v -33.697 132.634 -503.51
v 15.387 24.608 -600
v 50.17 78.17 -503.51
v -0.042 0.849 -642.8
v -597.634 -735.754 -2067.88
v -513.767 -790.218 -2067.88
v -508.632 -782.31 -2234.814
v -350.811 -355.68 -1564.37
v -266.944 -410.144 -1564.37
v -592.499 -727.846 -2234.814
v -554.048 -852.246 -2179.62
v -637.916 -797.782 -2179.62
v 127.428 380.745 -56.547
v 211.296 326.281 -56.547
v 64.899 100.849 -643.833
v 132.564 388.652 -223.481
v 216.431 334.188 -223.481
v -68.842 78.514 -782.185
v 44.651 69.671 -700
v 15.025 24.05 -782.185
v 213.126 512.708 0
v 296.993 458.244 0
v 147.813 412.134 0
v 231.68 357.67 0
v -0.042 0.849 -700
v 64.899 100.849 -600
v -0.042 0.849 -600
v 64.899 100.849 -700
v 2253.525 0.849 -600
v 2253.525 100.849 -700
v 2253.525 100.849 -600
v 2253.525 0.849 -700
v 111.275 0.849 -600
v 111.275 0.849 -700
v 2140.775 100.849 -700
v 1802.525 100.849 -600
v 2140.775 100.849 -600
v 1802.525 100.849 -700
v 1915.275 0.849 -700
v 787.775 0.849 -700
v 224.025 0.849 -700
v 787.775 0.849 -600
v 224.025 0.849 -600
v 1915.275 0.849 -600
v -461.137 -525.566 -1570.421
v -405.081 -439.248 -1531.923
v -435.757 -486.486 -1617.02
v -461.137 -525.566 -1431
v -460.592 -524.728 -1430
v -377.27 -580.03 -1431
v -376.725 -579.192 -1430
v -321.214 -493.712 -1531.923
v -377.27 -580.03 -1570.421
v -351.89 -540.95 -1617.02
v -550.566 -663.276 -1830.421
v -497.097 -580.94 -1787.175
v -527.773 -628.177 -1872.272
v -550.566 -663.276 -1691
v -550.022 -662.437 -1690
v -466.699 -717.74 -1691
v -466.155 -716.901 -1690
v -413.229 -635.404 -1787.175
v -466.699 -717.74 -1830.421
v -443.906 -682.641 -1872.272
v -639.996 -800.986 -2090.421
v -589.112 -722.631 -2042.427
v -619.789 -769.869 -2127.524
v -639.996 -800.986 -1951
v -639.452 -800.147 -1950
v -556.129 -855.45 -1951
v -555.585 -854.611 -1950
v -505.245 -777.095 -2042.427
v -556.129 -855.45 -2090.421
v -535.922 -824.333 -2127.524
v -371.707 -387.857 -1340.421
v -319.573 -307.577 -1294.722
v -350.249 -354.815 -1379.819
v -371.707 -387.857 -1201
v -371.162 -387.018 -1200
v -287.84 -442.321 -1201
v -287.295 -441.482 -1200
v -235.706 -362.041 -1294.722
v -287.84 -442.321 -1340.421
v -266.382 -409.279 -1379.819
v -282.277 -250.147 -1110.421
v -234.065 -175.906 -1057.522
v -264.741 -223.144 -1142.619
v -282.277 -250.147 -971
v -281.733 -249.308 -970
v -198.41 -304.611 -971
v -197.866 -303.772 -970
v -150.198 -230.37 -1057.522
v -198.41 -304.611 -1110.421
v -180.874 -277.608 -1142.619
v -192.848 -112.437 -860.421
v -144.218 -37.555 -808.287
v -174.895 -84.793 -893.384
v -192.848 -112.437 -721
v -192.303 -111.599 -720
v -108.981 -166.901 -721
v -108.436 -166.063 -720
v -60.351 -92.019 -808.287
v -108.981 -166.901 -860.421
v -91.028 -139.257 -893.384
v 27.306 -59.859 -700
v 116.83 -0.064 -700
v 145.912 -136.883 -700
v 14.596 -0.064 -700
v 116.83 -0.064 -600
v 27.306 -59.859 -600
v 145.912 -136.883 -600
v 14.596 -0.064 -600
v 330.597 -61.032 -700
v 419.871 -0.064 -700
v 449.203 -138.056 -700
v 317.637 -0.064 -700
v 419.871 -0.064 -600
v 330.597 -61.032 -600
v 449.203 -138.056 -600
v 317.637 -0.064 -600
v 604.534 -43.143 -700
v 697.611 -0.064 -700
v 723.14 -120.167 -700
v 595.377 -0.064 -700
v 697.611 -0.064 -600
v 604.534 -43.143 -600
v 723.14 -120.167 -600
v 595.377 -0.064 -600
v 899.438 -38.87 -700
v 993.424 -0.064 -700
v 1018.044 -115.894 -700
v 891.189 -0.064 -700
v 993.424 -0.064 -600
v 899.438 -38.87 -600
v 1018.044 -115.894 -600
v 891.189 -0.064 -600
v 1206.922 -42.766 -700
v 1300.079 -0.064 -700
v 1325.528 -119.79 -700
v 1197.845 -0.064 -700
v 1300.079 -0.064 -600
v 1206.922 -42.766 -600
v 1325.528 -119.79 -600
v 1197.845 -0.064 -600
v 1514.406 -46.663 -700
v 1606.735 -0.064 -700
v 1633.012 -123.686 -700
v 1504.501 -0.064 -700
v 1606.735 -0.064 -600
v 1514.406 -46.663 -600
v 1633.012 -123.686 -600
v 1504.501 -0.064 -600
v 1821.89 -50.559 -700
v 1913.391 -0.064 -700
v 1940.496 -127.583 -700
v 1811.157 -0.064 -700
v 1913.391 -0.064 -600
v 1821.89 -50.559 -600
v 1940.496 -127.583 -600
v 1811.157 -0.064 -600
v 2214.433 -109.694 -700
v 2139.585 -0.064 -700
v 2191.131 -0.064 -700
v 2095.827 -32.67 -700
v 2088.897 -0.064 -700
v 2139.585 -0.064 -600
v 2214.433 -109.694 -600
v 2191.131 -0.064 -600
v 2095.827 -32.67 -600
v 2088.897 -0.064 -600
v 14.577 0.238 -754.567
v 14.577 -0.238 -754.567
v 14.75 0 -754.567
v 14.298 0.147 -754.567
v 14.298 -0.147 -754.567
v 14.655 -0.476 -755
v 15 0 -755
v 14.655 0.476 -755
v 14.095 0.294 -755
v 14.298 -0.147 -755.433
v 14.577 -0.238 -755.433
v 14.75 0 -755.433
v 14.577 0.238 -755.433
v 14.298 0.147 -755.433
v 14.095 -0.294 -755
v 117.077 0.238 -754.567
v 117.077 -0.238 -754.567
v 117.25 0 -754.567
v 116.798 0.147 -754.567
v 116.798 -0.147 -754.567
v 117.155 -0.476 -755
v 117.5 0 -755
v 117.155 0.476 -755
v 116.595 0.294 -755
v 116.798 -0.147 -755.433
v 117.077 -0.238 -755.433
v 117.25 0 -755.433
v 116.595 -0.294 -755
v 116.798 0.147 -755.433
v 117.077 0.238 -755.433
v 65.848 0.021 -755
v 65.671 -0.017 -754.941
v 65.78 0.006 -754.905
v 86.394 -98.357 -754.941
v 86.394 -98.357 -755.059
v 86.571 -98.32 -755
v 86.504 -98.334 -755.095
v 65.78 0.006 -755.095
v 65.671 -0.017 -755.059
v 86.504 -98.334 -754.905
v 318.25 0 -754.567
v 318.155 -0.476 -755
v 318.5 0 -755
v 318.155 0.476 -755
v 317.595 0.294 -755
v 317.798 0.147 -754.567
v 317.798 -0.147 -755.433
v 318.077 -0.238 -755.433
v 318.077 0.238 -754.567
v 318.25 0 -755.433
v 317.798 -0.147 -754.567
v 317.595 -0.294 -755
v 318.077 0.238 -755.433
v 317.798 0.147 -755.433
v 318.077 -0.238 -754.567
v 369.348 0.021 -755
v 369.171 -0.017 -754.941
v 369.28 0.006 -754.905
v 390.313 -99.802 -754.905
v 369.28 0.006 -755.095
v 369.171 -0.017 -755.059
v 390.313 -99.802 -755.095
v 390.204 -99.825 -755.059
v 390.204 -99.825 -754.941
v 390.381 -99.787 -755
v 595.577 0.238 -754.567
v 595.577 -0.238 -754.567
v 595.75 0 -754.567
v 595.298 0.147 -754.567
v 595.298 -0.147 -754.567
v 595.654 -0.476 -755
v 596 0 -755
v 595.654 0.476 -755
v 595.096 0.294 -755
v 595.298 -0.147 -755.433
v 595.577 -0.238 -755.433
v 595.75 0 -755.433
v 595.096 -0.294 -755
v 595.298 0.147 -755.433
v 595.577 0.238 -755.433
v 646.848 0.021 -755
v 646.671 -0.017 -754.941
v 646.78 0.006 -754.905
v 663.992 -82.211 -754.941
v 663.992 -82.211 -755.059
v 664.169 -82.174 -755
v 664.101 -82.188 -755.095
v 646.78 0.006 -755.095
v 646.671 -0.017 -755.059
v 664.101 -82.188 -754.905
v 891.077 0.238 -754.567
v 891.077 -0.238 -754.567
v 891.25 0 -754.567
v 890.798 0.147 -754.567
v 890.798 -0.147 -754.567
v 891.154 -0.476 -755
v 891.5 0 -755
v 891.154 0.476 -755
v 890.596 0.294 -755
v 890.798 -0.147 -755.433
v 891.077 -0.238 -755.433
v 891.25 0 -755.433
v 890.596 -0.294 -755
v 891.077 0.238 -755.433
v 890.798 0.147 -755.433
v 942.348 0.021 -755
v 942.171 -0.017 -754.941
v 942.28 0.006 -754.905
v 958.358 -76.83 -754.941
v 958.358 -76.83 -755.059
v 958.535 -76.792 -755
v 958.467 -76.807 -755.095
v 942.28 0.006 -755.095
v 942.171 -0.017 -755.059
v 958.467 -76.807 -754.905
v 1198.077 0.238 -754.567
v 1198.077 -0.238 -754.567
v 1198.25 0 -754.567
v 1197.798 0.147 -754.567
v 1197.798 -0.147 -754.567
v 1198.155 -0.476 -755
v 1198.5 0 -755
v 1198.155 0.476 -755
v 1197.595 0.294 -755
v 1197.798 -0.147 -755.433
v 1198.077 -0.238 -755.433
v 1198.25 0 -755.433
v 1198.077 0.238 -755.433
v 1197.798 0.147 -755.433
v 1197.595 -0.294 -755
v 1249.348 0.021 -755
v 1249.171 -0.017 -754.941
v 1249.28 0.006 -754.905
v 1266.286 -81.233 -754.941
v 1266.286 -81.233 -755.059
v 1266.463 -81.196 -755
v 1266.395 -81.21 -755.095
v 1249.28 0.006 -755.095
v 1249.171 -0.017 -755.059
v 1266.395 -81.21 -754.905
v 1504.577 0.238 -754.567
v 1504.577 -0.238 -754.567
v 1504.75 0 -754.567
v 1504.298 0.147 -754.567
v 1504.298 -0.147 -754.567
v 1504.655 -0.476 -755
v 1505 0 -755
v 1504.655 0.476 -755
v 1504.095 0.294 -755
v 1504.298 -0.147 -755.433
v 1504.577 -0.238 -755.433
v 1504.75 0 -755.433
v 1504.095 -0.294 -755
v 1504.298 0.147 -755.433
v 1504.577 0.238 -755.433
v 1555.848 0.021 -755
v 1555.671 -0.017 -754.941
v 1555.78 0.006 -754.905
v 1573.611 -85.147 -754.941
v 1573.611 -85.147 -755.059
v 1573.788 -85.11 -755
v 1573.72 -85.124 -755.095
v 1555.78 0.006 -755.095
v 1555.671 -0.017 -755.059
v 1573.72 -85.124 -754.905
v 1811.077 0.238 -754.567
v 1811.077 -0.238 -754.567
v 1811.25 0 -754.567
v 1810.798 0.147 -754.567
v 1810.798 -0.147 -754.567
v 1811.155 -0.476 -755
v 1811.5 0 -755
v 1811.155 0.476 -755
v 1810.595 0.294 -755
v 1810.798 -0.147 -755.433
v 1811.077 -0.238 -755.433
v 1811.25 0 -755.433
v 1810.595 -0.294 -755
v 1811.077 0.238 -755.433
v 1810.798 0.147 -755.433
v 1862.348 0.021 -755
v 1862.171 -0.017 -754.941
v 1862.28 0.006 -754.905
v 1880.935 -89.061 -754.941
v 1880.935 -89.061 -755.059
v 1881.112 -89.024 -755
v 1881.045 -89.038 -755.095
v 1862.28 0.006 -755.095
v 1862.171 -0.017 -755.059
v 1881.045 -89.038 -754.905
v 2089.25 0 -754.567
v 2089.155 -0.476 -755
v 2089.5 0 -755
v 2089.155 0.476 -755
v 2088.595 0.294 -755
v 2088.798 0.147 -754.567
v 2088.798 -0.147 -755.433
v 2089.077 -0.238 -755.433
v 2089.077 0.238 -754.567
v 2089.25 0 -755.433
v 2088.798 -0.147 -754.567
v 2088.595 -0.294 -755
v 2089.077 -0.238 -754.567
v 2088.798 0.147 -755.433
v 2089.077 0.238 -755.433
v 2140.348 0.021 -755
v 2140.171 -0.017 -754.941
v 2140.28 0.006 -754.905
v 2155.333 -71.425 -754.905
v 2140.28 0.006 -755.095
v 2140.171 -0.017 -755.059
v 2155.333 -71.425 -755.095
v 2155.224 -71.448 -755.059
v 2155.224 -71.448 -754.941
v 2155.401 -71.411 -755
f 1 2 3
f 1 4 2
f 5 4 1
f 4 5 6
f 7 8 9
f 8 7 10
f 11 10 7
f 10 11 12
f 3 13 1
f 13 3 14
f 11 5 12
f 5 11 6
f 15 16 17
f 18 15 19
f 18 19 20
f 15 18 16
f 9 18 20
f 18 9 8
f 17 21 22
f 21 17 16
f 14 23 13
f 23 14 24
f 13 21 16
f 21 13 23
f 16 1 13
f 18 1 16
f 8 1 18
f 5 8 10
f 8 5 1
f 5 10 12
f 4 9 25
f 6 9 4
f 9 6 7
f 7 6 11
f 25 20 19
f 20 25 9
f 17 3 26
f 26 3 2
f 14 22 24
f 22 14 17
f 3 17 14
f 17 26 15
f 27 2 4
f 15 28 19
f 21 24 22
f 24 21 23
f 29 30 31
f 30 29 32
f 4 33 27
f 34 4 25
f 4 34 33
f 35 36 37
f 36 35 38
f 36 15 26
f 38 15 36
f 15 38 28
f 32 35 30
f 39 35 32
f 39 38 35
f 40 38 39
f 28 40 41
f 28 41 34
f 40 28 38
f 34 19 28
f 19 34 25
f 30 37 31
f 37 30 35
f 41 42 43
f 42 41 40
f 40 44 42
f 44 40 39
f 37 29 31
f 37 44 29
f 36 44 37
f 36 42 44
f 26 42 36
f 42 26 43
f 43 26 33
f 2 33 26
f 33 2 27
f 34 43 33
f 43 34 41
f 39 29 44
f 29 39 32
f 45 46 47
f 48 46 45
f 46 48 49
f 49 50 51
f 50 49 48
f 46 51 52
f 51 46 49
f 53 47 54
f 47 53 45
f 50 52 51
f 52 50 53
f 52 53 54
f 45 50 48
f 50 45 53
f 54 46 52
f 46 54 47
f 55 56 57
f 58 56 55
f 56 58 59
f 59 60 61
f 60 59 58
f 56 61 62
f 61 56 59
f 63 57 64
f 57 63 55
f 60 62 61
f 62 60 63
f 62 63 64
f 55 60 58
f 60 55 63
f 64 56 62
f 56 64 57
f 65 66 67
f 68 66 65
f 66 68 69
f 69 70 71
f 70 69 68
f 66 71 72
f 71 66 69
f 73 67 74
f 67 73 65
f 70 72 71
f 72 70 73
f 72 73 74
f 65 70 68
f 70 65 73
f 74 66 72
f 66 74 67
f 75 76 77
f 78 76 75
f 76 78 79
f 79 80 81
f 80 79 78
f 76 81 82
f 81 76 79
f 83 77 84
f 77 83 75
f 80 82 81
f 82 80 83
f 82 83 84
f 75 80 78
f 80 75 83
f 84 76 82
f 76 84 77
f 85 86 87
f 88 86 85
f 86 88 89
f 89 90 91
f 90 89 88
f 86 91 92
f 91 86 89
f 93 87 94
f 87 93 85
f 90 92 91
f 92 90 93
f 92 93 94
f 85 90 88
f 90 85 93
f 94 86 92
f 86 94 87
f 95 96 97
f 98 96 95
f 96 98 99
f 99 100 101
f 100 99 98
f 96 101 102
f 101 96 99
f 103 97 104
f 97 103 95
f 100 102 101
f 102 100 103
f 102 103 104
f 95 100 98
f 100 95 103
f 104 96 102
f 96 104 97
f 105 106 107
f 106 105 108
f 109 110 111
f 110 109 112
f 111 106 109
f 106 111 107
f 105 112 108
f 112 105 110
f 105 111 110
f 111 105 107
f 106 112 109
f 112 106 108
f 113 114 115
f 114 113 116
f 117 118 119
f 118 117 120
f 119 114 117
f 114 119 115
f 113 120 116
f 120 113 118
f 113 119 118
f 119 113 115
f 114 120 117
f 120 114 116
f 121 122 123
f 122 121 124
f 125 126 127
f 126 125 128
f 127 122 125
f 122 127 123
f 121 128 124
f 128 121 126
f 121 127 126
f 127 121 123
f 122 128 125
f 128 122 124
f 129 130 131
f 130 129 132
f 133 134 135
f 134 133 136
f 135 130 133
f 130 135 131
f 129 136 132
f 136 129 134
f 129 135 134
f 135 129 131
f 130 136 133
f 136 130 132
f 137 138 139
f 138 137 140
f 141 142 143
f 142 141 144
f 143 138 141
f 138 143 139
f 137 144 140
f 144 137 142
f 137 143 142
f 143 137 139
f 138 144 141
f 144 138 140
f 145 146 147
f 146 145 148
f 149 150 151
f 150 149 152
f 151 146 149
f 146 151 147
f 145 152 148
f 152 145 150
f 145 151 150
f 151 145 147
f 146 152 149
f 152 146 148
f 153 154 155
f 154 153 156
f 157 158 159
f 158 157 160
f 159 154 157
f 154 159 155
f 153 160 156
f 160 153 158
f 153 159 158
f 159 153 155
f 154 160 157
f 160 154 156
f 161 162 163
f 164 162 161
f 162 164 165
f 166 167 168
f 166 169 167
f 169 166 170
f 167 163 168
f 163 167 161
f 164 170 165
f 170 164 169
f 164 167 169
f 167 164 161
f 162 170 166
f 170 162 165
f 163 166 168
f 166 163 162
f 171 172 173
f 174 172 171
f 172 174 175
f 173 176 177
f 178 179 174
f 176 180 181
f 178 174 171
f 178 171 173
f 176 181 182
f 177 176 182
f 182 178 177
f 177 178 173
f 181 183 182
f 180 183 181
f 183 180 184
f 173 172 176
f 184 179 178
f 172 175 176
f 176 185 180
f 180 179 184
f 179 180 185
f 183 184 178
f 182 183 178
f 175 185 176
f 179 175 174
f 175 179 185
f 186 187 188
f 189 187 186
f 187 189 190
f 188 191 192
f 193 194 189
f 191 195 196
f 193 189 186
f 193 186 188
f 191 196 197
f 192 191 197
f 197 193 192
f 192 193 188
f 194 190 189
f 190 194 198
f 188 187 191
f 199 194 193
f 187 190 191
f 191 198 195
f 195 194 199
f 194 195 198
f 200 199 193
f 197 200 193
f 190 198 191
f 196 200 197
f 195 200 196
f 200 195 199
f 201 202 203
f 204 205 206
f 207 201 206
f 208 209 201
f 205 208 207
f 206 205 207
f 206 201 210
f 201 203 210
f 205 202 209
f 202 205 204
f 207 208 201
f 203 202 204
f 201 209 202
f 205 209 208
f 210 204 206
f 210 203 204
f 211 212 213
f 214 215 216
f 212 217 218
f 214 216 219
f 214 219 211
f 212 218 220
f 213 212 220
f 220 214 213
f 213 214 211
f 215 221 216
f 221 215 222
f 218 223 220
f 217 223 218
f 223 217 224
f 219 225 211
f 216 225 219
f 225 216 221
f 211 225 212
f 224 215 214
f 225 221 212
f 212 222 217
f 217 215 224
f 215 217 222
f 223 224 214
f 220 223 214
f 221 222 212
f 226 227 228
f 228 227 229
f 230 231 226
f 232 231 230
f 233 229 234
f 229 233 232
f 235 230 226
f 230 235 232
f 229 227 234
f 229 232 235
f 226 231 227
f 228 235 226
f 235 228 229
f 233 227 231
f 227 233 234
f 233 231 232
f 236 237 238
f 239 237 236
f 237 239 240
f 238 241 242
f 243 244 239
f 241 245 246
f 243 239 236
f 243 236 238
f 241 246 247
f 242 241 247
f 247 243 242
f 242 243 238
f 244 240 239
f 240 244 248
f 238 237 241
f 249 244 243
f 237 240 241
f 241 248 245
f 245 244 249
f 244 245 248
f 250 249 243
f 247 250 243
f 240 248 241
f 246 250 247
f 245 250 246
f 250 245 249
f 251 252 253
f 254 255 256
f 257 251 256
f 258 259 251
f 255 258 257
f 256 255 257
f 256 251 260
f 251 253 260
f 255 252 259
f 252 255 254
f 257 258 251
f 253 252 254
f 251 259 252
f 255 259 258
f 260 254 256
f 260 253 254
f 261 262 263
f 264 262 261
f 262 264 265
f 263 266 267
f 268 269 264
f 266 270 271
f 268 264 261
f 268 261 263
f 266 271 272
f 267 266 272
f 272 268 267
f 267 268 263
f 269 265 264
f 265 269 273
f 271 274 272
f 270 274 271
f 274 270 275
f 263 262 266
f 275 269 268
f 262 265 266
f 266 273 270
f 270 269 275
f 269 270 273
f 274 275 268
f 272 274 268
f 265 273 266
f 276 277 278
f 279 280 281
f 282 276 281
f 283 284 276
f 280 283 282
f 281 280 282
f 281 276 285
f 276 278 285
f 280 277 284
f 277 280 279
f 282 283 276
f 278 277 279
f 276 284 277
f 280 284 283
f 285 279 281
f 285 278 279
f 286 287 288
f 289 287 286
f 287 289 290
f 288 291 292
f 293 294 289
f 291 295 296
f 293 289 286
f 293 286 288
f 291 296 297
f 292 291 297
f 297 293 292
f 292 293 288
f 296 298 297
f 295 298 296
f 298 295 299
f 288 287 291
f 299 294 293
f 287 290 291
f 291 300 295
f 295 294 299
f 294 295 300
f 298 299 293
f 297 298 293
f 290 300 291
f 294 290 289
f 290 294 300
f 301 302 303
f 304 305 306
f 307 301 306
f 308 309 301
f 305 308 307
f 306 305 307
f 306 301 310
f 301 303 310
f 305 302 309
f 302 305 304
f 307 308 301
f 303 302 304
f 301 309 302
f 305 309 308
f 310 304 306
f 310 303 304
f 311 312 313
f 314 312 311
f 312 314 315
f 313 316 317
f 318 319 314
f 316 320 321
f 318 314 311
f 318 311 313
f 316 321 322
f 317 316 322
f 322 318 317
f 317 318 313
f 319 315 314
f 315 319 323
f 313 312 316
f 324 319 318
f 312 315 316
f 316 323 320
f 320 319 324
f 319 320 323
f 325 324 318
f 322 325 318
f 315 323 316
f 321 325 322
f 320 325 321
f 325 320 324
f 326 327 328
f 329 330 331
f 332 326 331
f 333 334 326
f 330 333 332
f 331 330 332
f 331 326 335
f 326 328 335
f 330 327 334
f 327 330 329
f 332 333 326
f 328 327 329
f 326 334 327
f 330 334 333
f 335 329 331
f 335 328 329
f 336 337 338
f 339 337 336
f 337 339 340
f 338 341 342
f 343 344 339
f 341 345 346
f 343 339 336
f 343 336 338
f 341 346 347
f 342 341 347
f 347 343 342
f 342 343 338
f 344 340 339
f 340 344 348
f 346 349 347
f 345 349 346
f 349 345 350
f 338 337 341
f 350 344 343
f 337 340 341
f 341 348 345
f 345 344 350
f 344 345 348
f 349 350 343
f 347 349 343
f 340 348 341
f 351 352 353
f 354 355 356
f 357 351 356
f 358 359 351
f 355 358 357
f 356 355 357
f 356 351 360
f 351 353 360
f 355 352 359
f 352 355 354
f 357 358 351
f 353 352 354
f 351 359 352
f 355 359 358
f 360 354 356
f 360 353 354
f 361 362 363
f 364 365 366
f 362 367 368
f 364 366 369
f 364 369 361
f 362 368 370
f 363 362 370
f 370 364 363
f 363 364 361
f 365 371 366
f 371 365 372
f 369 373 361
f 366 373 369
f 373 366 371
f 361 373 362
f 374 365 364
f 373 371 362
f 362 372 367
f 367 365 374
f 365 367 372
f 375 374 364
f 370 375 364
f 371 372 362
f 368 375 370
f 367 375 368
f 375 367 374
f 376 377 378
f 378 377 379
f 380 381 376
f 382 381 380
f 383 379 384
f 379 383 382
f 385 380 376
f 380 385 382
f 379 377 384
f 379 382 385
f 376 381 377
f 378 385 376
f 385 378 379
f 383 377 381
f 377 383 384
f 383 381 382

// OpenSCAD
generateStepPlatesDFX =      0;
generateLowStumpsMeas =      1;//see code, manual meas. stumps size and it's loc. on the strings,stumps and longStrings should be only enable.
generateHighStumpsMeas =     0;//see code, manual meas. stumps size and it's loc. on the strings,stumps and longStrings should be only enable.
allca =                      0; //displaying of strucrural elements of the home is localy defined
allco =                      0; //force enable displaying of strucrural elements of the home
strs  =                      0;  //steps displaying
railingFence =               0;
stepPlates =                 0; 
stumps =                     1;
longStrings =                1;
otherStaff =                 0;

stairH = 164.2;//173.88;//164.7
stairD =260;
stairTHS = 40;
nosing = 40;

alphaWalls =  0.3;
meshCoef = 0;//.97;
meshSize =  stairH/2;

flourtoflour = 3120;
ceilingtoflour = 2830;

corid_length = 6644;
corid_width = 2126;

//стена запад
wallsouth       = 2014;
arcDoorWay      = 1420;
arcDoorWayHeith = 2100;
wallNorth       = 3210;

//стена север
norRight     = 803;
norWindowWdth= 668;
norLeft      = 632;
windowToFlour= 1000;

//стена восток
eastOpening    = 1890;
eastMeas1      = 3745;
eastMeas2      = 4506;
eastMeas3      = 5671;
eastMeas4      = 6483;
eastDoorWayHeith = 2100;
eastDoorWayUnif  = 800;

//стена входная дверь

//перекрытие малое
plateWidth = 1203;
//перекрытие большое
norWallDist = 3670;
//

//
module super(){
eastWall1      = eastMeas1 - eastOpening;
toilDoorWay    = eastMeas2 - eastMeas1;
eastWall2      = 5671 - 4506;

steel = "blue";
wood  = "BurlyWood";
wals = "SlateGray" ;
ceiling   = "White";
color(  alpha = alphaWalls );

stairAlpha = 0.5;
if(0){//measurement tool
translate([-3690,-0,2100]) color("red") sphere(r = 1);
translate([-3100,-0,1460.5]) color("green") sphere(r = 1);
translate([-3100,-0,1340]) color("green") sphere(r = 1);
*translate([-1100,-600,0]) color("green") sphere(r = 50);
translate([-3050,-2195,2930]) color("green") sphere(r = 10);
translate([-3050,-2185,2895]) color("green") sphere(r = 1);
translate([-3050,-2195,3130]) color("green") sphere(r = 10);
translate([-3050,-2195,3044-stairH]) color("green") sphere(r = 2);
translate([-3050,-2223,3001-stairH]) color("green") sphere(r = 2);
translate([-3050,-2195,2980-stairH]) color("green") sphere(r = 2);
translate([-3050,-2195,2996.5-stairH]) color("green") sphere(r = 2);
translate([-3050,-2145,3068-stairH]) color("green") sphere(r = 2);
translate([-3000,-600,1734]) color("green") sphere(r = 2);
translate([-2710,-986,2734]) color("green") sphere(r = 1);
translate([-2580,-986,2734]) color("green") sphere(r = 1);
translate([-2710,-986-130,2734]) color("green") sphere(r = 1);


//stairs beacons
translate([000,-1300,164.2]) color("purple") sphere(r = 1);
translate([000,-838,164.2]) color("purple") sphere(r = 1);

translate([000,-876, 2*164.2]) color("purple") sphere(r = 1);
translate([000,-323, 2*164.2]) color("purple") sphere(r = 1);

translate([000,-373, 3*164.2]) color("purple") sphere(r = 1);
translate([000,   0, 3*164.2]) color("purple") sphere(r = 1);//
translate([-323,  0, 3*164.2]) color("purple") sphere(r = 1);

translate([-274,  0, 4*164.2]) color("purple") sphere(r = 1);
translate([-854  ,0, 4*164.2]) color("purple") sphere(r = 1);

translate([-816,  0, 5*164.2]) color("purple") sphere(r = 1);
translate([-1290, 0, 5*164.2]) color("purple") sphere(r = 1);

translate([-1250, 0, 6*164.2]) color("purple") sphere(r = 1);
translate([-1550, 0, 6*164.2]) color("purple") sphere(r = 1);

translate([-1510, 0, 7*164.2]) color("purple") sphere(r = 1);
translate([-1810, 0, 7*164.2]) color("purple") sphere(r = 1);

translate([-1770, 0, 8*164.2]) color("purple") sphere(r = 1);
translate([-2070, 0, 8*164.2]) color("purple") sphere(r = 1);

translate([-2030, 0, 9*164.2]) color("purple") sphere(r = 1);
translate([-2330, 0, 9*164.2]) color("purple") sphere(r = 1);

translate([-2260, 0,10*164.2]) color("purple") sphere(r = 1);
translate([-2721, 0,10*164.2]) color("purple") sphere(r = 1);

translate([-2700, 0,11*164.2]) color("purple") sphere(r = 1);
translate([-3152, 0,11*164.2]) color("purple") sphere(r = 1);

translate([-3106, 0,12*164.2]) color("purple") sphere(r = 1);
translate([-3690, 0,12*164.2]) color("purple") sphere(r = 1);

translate([-3690,      0,13*164.2]) color("purple") sphere(r = 1);
translate([-3690,   -548,13*164.2]) color("purple") sphere(r = 1);

translate([-3690,   -501,14*164.2]) color("purple") sphere(r = 1);
translate([-3690,   -969,14*164.2]) color("purple") sphere(r = 1);

translate([-3690,   -927,15*164.2]) color("purple") sphere(r = 1);
translate([-3690,  -1390,15*164.2]) color("purple") sphere(r = 1);

translate([-3690,  -1350,16*164.2]) color("purple") sphere(r = 1);
translate([-3690,  -1650,16*164.2]) color("purple") sphere(r = 1);

translate([-3690,  -1610,17*164.2]) color("purple") sphere(r = 1);
translate([-3690,  -1910,17*164.2]) color("purple") sphere(r = 1);

translate([-3690,  -1870,18*164.2]) color("purple") sphere(r = 1);
translate([-3690,  -2170,18*164.2]) color("purple") sphere(r = 1);

translate([-3690,  -2170,19*164.2]) color("purple") sphere(r = 1);

translate([-2334,  -800,1200]) color("purple") sphere(r = 4);
translate([-2507f,  -800,1200]) color("purple") sphere(r = 4);
translate([-3655,-80,0]) color("red") sphere(r = 1);
translate([-3690,-50,0]) color("red") sphere(r = 1);
translate([-3680,-50,0]) color("red") sphere(r = 1);
translate([-2725,-2030,2500]) color("red") sphere(r = 1);
translate([-2690,-2030,2500]) color("red") sphere(r = 1);

translate([-2560,-965,1500]) color("red") sphere(r = 1);
translate([-2560,-1000,1500]) color("red") sphere(r = 1);
translate([-1000,-1100,3*stairH-205]) color("purple") sphere(r = 1);
//translate([-3690,  -2170,18*164.2]) color("purple") sphere(r = 1);
}



module mesh(CS,PF){
    size  = 7000;
    c=0;
    for(b=[0:1:size/CS]){
        translate([0,CS*b,0]) for (a= [0:1:size/CS]){translate([CS*a,0,0]) square([CS*PF,CS*PF],center=false);}
    }
}

module qTube(l,d){
    color("blue",0.5)
cube([d,d,l],false);
}    

module qTube2(l,d,dd){
    color("blue",0.5)
    linear_extrude(height = l, center = false, convexity = 10,  slices = 20, scale = 1.0, $fn = 16)    
        square([d,dd],center=false);
} 

// косоур поворота
if(otherStaff)translate([-25,-25,0]){
translate([-1075,-675,611]) rotate([0,90,0])qTube2(125,100,50);
translate([-985,-660,611]) rotate([180,0,45])qTube2(264,50,100);
translate([-914,-731,447]) rotate([45,90,0])qTube2(86,100,50);
translate([-853,-792,447]) rotate([180,0,45])qTube2(264,50,100);
translate([-797,-828,283]) rotate([90,90,0])qTube2(105,100,50);
translate([-797,-933,283]) rotate([180,0,0])qTube2(295,50,100);
translate([-797,-1033,19]) rotate([90,0,0])qTube2(180,50,100);
}
module mainString(a){
j=2;
if(j==0)translate([-3100,0,1344]) rotate([56.83,0,0])qTube2(2680,a,a);//old
if(j==1) translate([-3100,0,1364]) rotate([57.65,0,0])qTube2(2680,a,a);/*paralel*/
if(j==2)translate([-3100,0,1344]) rotate([56.5,0,0])qTube2(2680,a,a);//very close 56.5
}

if(longStrings)difference(){mainString(100);translate([-3200,0,1200])cube(500);}
module AuxString(a){
    
    translate([-1110,-700 ,662]) rotate([180+123,0,90])qTube2(2255,a,a);
}
//
if(longStrings){
  
    difference(){AuxString(100);translate([-3400,-800,stairH*10]) cube(400);}
}
//опорный столбик
if(otherStaff)translate([-1100,-600,587]) rotate([180,0,270])qTube(583,100);

//upper string holder
if(otherStaff)translate([-3450,-2195,2915]) rotate([0,90,0])qTube2(800,100,50);

//stringer plate
if(otherStaff)translate([-3050,0,1380])rotate([0,90,90]) color("blue",0.5)linear_extrude(height = 5, center = false, convexity = 10,  slices = 20, scale = 1.0, $fn = 16)    square([280,250],center = true);
//крепление подвеса
if(otherStaff)translate([-3665,-2190,3052]) rotate([0,90,90])color("blue",0.5)linear_extrude(height = 2190, center = false, convexity = 10,  slices = 20, scale = 1.0, $fn = 16)    
polygon(points=[[0,0],[140,0],[140,5],[5,5],[5,140],[0,140]]);

//stumps
module stump(coord){
    difference(){translate(coord){
    difference(){{rotate([180-45,0,0])qTube(200,100);
    translate([99,-100,101])cube([200,200,200],center = true);}}
    }translate([-1,0,0])mainString(101);}
}
module stumpsAuxString(coord){
    difference(){translate(coord){
    difference(){{rotate([180+45,0,90])qTube(200,100);
    translate([99,-100,101])cube([500,500,350],center = true);}}
    }translate([-0.5,0,sqrt(2)])AuxString(101);translate([0,45,0])mainString(101);}
}

module stumpPlenty(){

    translate([0,0,0]){
for (a =[0:1:2])stump([-3100,-1430 -a*stairD ,2581+a*stairH]);
stump([-3100,-1430 +1*stairD -30,2581-1*stairH]);
stump([-3100,-1430 +2*stairD -60,2581-2*stairH]);
stump([-3100,-1440 +3*stairD -60,2581-3*stairH]);
stumpsAuxString([-2870,-700 ,stairH*12+29]);
stumpsAuxString([-2615,-700 ,stairH*11+29]);
stumpsAuxString([-2395,-700 ,stairH*10+29]);
for (a =[0:1:3])stumpsAuxString([-2150+a*stairD ,-700 ,stairH*(9-a)+29]);
stumpsAuxString([-2190+4*stairD,-700 ,stairH*5+29]);
}
}
if(stumps)color( steel, stairAlpha )render () stumpPlenty();
    

module handrailGrating(d,f){
    
    color( steel, stairAlpha ){
//решетка лицевая
    a=130;
    
    
aa = 130;//136.5;    
    bb= 1240;
        b=bb;
l = -3655;
h = 2092-5;
q=1950;
    s=stairH;
translate([l,-b-a*0,h+2*s])linear_extrude(height=q-2*s)offset(f)offset(-f)square(d,center=true);
translate([l,-b+a*1,h+2*s])linear_extrude(height=q-2*s)offset(f)offset(-f)square(d,center=true);
translate([l,-b+a*2,h+1*s])linear_extrude(height=q-1*s)offset(f)offset(-f)square(d,center=true);
        echo("fg",l,-b+a*2,h+1*s);
translate([l,-b+a*3,h+1*s])linear_extrude(height=q-1*s)offset(f)offset(-f)square(d,center=true);
translate([l,-b+a*4,h+1*s])linear_extrude(height=q-1*s)offset(f)offset(-f)square(d,center=true);
translate([l,-b+a*5,h+0*s])linear_extrude(height=q-0*s)offset(f)offset(-f)square(d,center=true);
        echo("gf",l,-b+a*5,h+0*s);
translate([l,-b+a*6,h+0*s])linear_extrude(height=q-0*s)offset(f)offset(-f)square(d,center=true);
translate([l,-b+a*7,h+0*s])linear_extrude(height=q-0*s)offset(f)offset(-f)square(d,center=true);
translate([l,-b+a*8,h-0*s])linear_extrude(height=q-0*s)offset(f)offset(-f)square(d,center=true);
translate([l,-b+a*9,h-0*s])linear_extrude(height=q+0*s)offset(f)offset(-f)square(d,center=true);

translate([-3470 ,-182,h-1*s])linear_extrude(height=s+10)offset(f)offset(-f)square(d,center=true);
translate([-3304,-25,h-1*s])linear_extrude(height=s+10)offset(f)offset(-f)square(d,center=true);


translate([l,-bb-aa*1,h+2*s])linear_extrude(height=q-2*s)offset(f)offset(-f)square(d,center=true);
translate([l,-bb-aa*2,h+3*s])linear_extrude(height=q-3*s)offset(f)offset(-f)square(d,center=true);
translate([l,-bb-aa*3,h+3*s])linear_extrude(height=q-3*s)offset(f)offset(-f)square(d,center=true);
translate([l,-bb-aa*4,h+4*s])linear_extrude(height=q-4*s)offset(f)offset(-f)square(d,center=true);
translate([l,-bb-aa*5,h+4*s])linear_extrude(height=q-4*s)offset(f)offset(-f)square(d,center=true);
translate([l,-bb-aa*6,h+5*s])linear_extrude(height=q-5*s)offset(f)offset(-f)square(d,center=true);
translate([l,-bb-aa*7,h+5*s])linear_extrude(height=q-5*s)offset(f)offset(-f)square(d,center=true);

}


color( steel, stairAlpha ){
    a=137;
    b = 205;//144;
    
aa = 130;//136.5;    
    bb= 1240;
    bbb = bb -12;
l = -2725;
h = 2092;
q=1950;
    s=stairH;
    
translate([l,-bbb-a*0,h+1*s-5])linear_extrude(height=q-1*s-450)offset(f)offset(-f)square(d,center=true);
translate([l,4-bbb+a*1,h+0*s-5])linear_extrude(height=q-2*s-240)offset(f)offset(-f)square(d,center=true);
translate([l+20,-10-bbb+a*2+1,h-1*s-5])linear_extrude(height=q-1*s-300)offset(f)offset(-f)square(d,center=true);
echo(l+20,-10-bbb+a*2+1,h-1*s-5);

translate([l,-bb-aa*1,h+2*s-5])linear_extrude(height=q-2*s-370)offset(f)offset(-f)square(d,center=true);
translate([l,-bb-aa*2,h+3*s-5])linear_extrude(height=q-3*s-310)offset(f)offset(-f)square(d,center=true);
translate([l,-bb-aa*3,h+3*s-5])linear_extrude(height=q-3*s-200)offset(f)offset(-f)square(d,center=true);
translate([l,-bb-aa*4,h+4*s-5])linear_extrude(height=q-4*s-120)offset(f)offset(-f)square(d,center=true);
translate([l,-bb-aa*5,h+4*s-5])linear_extrude(height=q-4*s-40)offset(f)offset(-f)square(d,center=true);
translate([l,-bb-aa*6,h+5*s-5])linear_extrude(height=q-5*s+10)offset(f)offset(-f)square(d,center=true);
translate([l,-bb-aa*7,h+5*s-5])linear_extrude(height=q-5*s+90)offset(f)offset(-f)square(d,center=true);
}



color( steel, stairAlpha ){
//решетка лицевая
    a=143.5;
    b = 205;//144;
    
aa = 130;//136.5;    
    bb= 1240+3*sh;
l = -965;
h = 610;
q=1950;
    s=stairH;
    aw=10;//12;

translate([-bb+aa*2+15,l-100-1,h-2*s])linear_extrude(height=q-3*s-260)offset(f)offset(-f)rotate([0,0,36])square(d,center=true);
translate([-bb+aa*2-37,l,h-1*s])      linear_extrude(height=q-2*s-190)offset(f)offset(-f)rotate([0,0,52])square(d,center=true);
translate([-bb+aa*1-20,l,h+0*s])linear_extrude(height=q-2*s-280)offset(f)offset(-f)square(d,center=true);
translate([-bb-aa*0,l,h+1*s])linear_extrude(height=q-2*s-370)offset(f)offset(-f)square(d,center=true);
translate([-bb-aa*1,l,h+2*s])linear_extrude(height=q-2*s-450)offset(f)offset(-f)square(d,center=true);
translate([-bb-aa*2,l,h+2*s])linear_extrude(height=q-3*s-220)offset(f)offset(-f)square(d,center=true);
translate([-bb-aa*3,l,h+3*s])linear_extrude(height=q-3*s-300)offset(f)offset(-f)square(d,center=true);
translate([-bb-aa*4,l,h+3*s])linear_extrude(height=q-4*s-50)offset(f)offset(-f)square(d,center=true);
translate([-bb-aa*5,l,h+4*s])linear_extrude(height=q-4*s-120)offset(f)offset(-f)square(d,center=true);
translate([-bb-aa*6,l,h+4*s])linear_extrude(height=q-5*s+110)offset(f)offset(-f)square(d,center=true);
translate([-bb-aa*7,l,h+5*s])linear_extrude(height=q-5*s+20)offset(f)offset(-f)square(d,center=true);
translate([-bb-aa*8,l,h+5*s])linear_extrude(height=q-5*s+100)offset(f)offset(-f)square(d,center=true);
translate([-bb-aa*9-aw,l,h+6*s])linear_extrude(height=q-5*s+20)offset(f)offset(-f)square(d,center=true);
translate([-bb-aa*10-2*aw,l,h+7*s])linear_extrude(height=q-5*s-30)offset(f)offset(-f)square(d,center=true);
}
}



//hand rail
module handRail(){
translate([-3675,-000,4000]) rotate([90,0,0])qTube(2200,50);
translate([-2745,-1000,3394]) rotate([57.65,0,0])qTube(1500,50);
translate([-2745,-1000,2924]) rotate([-57.65+90+90,0,90])qTube(2030,50);
translate([-985,-1100,1500]) rotate([90-57.65-90,0,30])qTube(160,50);
}
module railing(){
    handrailGrating(20,2.5);
    if(1)handRail();
}
if(railingFence)railing();
module pivot5x5(ths,lev,vstp,pivotPlate,offsetv,offsetv_,plgn){

st = stairD*1;
sp = pivotPlate + st;
    pivotPlatex = pivotPlate;
    pivotPlatey = pivotPlate;// this is it
    spx = pivotPlatex + st;
    spy = pivotPlatey + st;
c=1;
cf15 = 0.9;//coef 12_45
adf = 2.69;

c1t = 1/adf; 
c2t = 2/adf;
    
c1p = 1/adf; 
c2p = 2/adf;
    
ax1 =   0 * c; ay1 =  st * c; bx1 =   0 * c; by1 =  spy * c; cx1 =(spx*c1p+vstp/sin(72))*cf15*c; cy1 =  spy * c; dx1 =(st*c1t+vstp/sin(72))*c; dy1 =  st * c;
ax2 =st*c1t*c; ay2 =  st * c; bx2 =spx*c1p*cf15*c; by2 =  spy * c; cx2 =(spx*c2p+vstp/sin(54))*c; cy2 =  spy * c; dx2 =(st*c2t+vstp/sin(54))*c; dy2 =  st * c;
ax3 =st*c2t*c; ay3 =  st * c; bx3 =spx*c2p*c; by3 =  spy * c; cx3 =(spx+vstp/sin(54))*c; cy3 = spy  * c; dx3 =(st+vstp/sin(54))*c; dy3 = st  * c;
ax4 = st  * c; ay4 = st  * c; bx4 = spx  * c; by4 = spy  * c; cx4 = spx   * c; cy4 =(spy*c2p-vstp/sin(54))*c; dx4 = st  * c; dy4 =(st*c2t-vstp/sin(54))*c;
ax5 = st  * c; ay5 =st*c2t*c; bx5 = spx  * c; by5 =spy*c2p*c; cx5 = spx   * c; cy5 =(spy*c1p-vstp/sin(72))*cf15*c; dx5 = st  * c; dy5 =(st*c1t-vstp/sin(72))*c;
ax6 = st  * c; ay6 =st*c1t*c; bx6 = spx  * c; by6 =spy*c1p*cf15*c; cx6 = spx   * c; cy6 =-vstp* c; dx6 = st  * c; dy6 =-vstp * c;

    translate([0,0,-lev*5-ths])
        linear_extrude(height = ths, center = false, convexity = 10,  slices = 20, scale = 1.0, $fn = 16)
           offset(offsetv)offset(-offsetv)difference(){offset(-offsetv_)polygon(points=[[ax6, ay6], [bx6, by6], [cx6, cy6], [dx6, dy6]]);polygon(plgn);}
            
    translate([0,0,-lev*4-ths])
        linear_extrude(height = ths, center = false, convexity = 10,  slices = 20, scale = 1.0, $fn = 16)
            offset(offsetv)offset(-offsetv)difference(){offset(-offsetv_)polygon(points=[[ax5, ay5], [bx5, by5], [cx5, cy5], [dx5, dy5]]);polygon(plgn);}
            
    translate([0,0,-lev*3-ths])
        linear_extrude(height = ths, center = false, convexity = 10,  slices = 20, scale = 1.0, $fn = 16)
            offset(offsetv)offset(-offsetv)difference(){offset(-offsetv_)polygon(points=[[ax3, ay3], [bx3, by3], [cx4, cy3], [cx4, cy4], [dx4, dy4]]);polygon(plgn);}            

    translate([0,0,-lev*2-ths])
        linear_extrude(height = ths, center = false, convexity = 10,  slices = 20, scale = 1.0, $fn = 16)
            offset(offsetv)offset(-offsetv)difference(){offset(-offsetv_)polygon(points=[[ax2-3/2*sh, ay2], [bx2-3/2*sh, by2], [cx2, cy2], [dx2, dy2]]);polygon(plgn);}
            
    translate([0,0,-lev-ths])
        linear_extrude(height = ths, center = false, convexity = 10,  slices = 20, scale = 1.0, $fn = 16)
            offset(offsetv)offset(-offsetv)difference(){offset(-offsetv_)polygon(points=[[ax1-3*sh, ay1], [bx1-3*sh, by1], [cx1-3/2*sh, cy1], [dx1-3/2*sh, dy1]]);polygon(plgn);} 

    //linear_extrude(height = ths)polygon(plgn);

}

module stair(n,stD,stH,xl,yl,zl,offsetv,offsetv_){//
    color( wood, stairAlpha ) 
        for (a =[0:1:n-1])
            translate([0,-stairD*a,a*stairH-stairTHS])
                linear_extrude(height = zl, center = false, convexity = 10,  slices = 20, scale = 1.0, $fn = 16)  
                    offset(offsetv)offset(-offsetv-offsetv_)square([xl,yl],center = false);
}

sh = 0;//16.6;//shift some steps shift for better period 
module pivot6x6(ths,lev,vstp,pivotPlate,offsetv,offsetv_,plgn){

st = stairD*1.5;
sp = pivotPlate + st;
    pivotPlatex = pivotPlate;
    pivotPlatey = pivotPlate;// this is it
    spx = pivotPlatex + st;
    spy = pivotPlatey + st;
c=1;

c1t = 1/3; 
c2t = 2/3;
    
c1p = 1/3.6; //angl btw 1st - 2nd step
c2p = 2/3.4; //angl btw 2nd - 3rd step
    
ax1 =   0 * c; ay1 =  st * c; bx1 =   0 * c; by1 =  spy * c; cx1 =(spx*c1p+vstp/sin(75))*c; cy1 =  spy * c; dx1 =(st*c1t+vstp/sin(75))*c; dy1 =  st * c;
ax2 =st*c1t*c; ay2 =  st * c; bx2 =spx*c1p*c; by2 =  spy * c; cx2 =(spx*c2p+vstp/sin(60))*c; cy2 =  spy * c; dx2 =(st*c2t+vstp/sin(60))*c; dy2 =  st * c;
ax3 =st*c2t*c; ay3 =  st * c; bx3 =spx*c2p*c; by3 =  spy * c; cx3 =(spx+vstp/sin(45))*c; cy3 = spy  * c; dx3 =(st+vstp/sin(45))*c; dy3 = st  * c;
ax4 = st  * c; ay4 = st  * c; bx4 = spx  * c; by4 = spy  * c; cx4 = spx   * c; cy4 =(spy*c2p-vstp/sin(60))*c; dx4 = st  * c; dy4 =(st*c2t-vstp/sin(60))*c;
ax5 = st  * c; ay5 =st*c2t*c; bx5 = spx  * c; by5 =spy*c2p*c; cx5 = spx   * c; cy5 =(spy*c1p-vstp/sin(75))*c; dx5 = st  * c; dy5 =(st*c1t-vstp/sin(75))*c;
ax6 = st  * c; ay6 =st*c1t*c; bx6 = spx  * c; by6 =spy*c1p*c; cx6 = spx   * c; cy6 =-vstp* c; dx6 = st  * c; dy6 =-vstp * c;

    translate([0,0,-lev*6-ths])
        linear_extrude(height = ths, center = false, convexity = 10,  slices = 20, scale = 1.0, $fn = 16)
            offset(offsetv)offset(-offsetv)difference(){offset(-offsetv_)polygon(points=[[ax6, ay6+2*sh], [bx6, by6+2*sh], [cx6, cy6+3*sh], [dx6, dy6+3*sh]]);polygon(plgn);}    
    translate([0,0,-lev*5-ths])
        linear_extrude(height = ths, center = false, convexity = 10,  slices = 20, scale = 1.0, $fn = 16)
            offset(offsetv)offset(-offsetv)difference(){offset(-offsetv_)polygon(points=[[ax5, ay5+1*sh], [bx5, by5+1*sh], [cx5, cy5+2*sh], [dx5, dy5+2*sh]]);polygon(plgn);}
    translate([0,0,-lev*4-ths])
        linear_extrude(height = ths, center = false, convexity = 10,  slices = 20, scale = 1.0, $fn = 16)
            offset(offsetv)offset(-offsetv)difference(){offset(-offsetv_)polygon(points=[[ax4, ay4], [bx4, by4], [cx4, cy4+1*sh], [dx4, dy4+1*sh]]);polygon(plgn);}
    translate([0,0,-lev*3-ths])
        linear_extrude(height = ths, center = false, convexity = 10,  slices = 20, scale = 1.0, $fn = 16)
            offset(offsetv)offset(-offsetv)difference(){offset(-offsetv_)polygon(points=[[ax3, ay3], [bx3, by3], [cx3, cy3], [dx3, dy3]]);polygon(plgn);}
    translate([0,0,-lev*2-ths])
        linear_extrude(height = ths, center = false, convexity = 10,  slices = 20, scale = 1.0, $fn = 16)
            offset(offsetv)offset(-offsetv)difference(){offset(-offsetv_)polygon(points=[[ax2, ay2], [bx2, by2], [cx2, cy2], [dx2, dy2]]);polygon(plgn);}
    translate([0,0,-lev-ths])
        linear_extrude(height = ths, center = false, convexity = 10,  slices = 20, scale = 1.0, $fn = 16)
            offset(offsetv)offset(-offsetv)difference(){offset(-offsetv_)polygon(points=[[ax1, ay1], [bx1, by1], [cx1, cy1], [dx1, dy1]]);polygon(plgn);}

            //linear_extrude(height = ths)polygon(plgn);
}


// plates cutting aux body-
module platesCuttingAuxBody1(){
    linear_extrude(height = 3000, center = false, convexity = 10,  slices = 20, scale = 1.0, $fn = 16)
            polygon(points=[[0, -1400], [0, 0], [-1000, 0], [-1000, -550], [-725, -830], [-725, -1400]]);
}
module platesCuttingAuxBody2(){
    linear_extrude(height = 3000, center = false, convexity = 10,  slices = 20, scale = 1.0, $fn = 16)
            polygon(points=[[-3640, 100], [-3740, 100], [-3740, -50], [-3740, -50], [-3740, -2200], [-2750, -2200], [-2750, -950],[-2000, -950], [-2000, 100]]);
}    
CuttingAuxBody3poly = [[-3640, 100], [-3740, 100], [-3740, -50], [-3640, -50], [-3640, -2200], [-2650, -2200], [-2650, -1050],[-2000, -1050], [-2000, 100]];
module platesCuttingAuxBody3(){
    linear_extrude(height = 3000, center = false, convexity = 10,  slices = 20, scale = 1.0, $fn = 16)
     polygon(points=CuttingAuxBody3poly);
}

CuttingAuxBody4poly = [[-100,-100],[1500,-100],[1500,1540],[1350,1540],[1350,1340],[-100,1340]];
module platesCuttingAuxBody4(){
    linear_extrude(height = 3000, center = false, convexity = 10,  slices = 20, scale = 1.0, $fn = 16)
     polygon(points=CuttingAuxBody4poly);
}
//platesCuttingAuxBody1();
//platesCuttingAuxBody2();
//platesCuttingAuxBody3();
//platesCuttingAuxBody4();
module stairsPlatets(offsetv, offsetv_){
    {
        base=270;
        gap = 440;
        d=50;
    //5x5    
    translate([-1260,-1260,6*stairH-40])  color( steel, stairAlpha )pivot5x5(5,stairH,nosing,1000,offsetv,    0,[[-100,base+50],[base+50,base+50],[base+50,150],[base,150],[base,-100],[1500,-100],[1500,1540],[-150,1540],[-150,-100],[base,-100],[base,base-90],[base-52,base],[-100,base]]);
    translate([-1260,-1260,6*stairH-40])  color( steel, stairAlpha )pivot5x5(5,stairH,offsetv_,1000,offsetv,       offsetv_,[[-100,base+gap],[base+gap-00,base+gap],[base+gap-00,-100],[1500,-100],[1500,1340],[-150,1340],[-150,-100],[base,-100],[base,base],[-100,base]]);
}


    //lower round 4 stepr
    if(1)mirror([0,1,0])color( steel, stairAlpha ){
        translate([-1000-stairD*2-3*sh,1000-10,6*stairH-5]) rotate([0,0,270]) stair(4,stairD,stairH,440+offsetv_,stairD+offsetv_,5,offsetv,offsetv_);
        translate([-1000-stairD*2-3*sh,1000-10,6*stairH-5]) rotate([0,0,270]) stair(4,stairD,stairH,50,stairD+nosing,5,offsetv,0);
    }
    
    
    //6x6 
    /*outer*/
    translate([-norWallDist +1380,-1390,stairH*16-40]) rotate([0,0,90]) color( steel, stairAlpha )pivot6x6(5,stairH,nosing,1000,offsetv,0,CuttingAuxBody4poly);

    /*inner*/
    translate([-norWallDist +1370,-1390,stairH*16-40]) rotate([0,0,90]) color( steel, stairAlpha )pivot6x6(5,stairH,nosing,1000,offsetv,0,    [[-100,400+50],[400+50,400+50],[400+50,-100],[1500,-100],[1500,1540],[-150,1540],[-150,-100],[400,-100],[400,400],[-100,400]]);
    /*body*/
    translate([-norWallDist +1370,-1390,stairH*16-40]) rotate([0,0,90]) color( steel, stairAlpha )pivot6x6(5,stairH,offsetv_,1000,offsetv,offsetv_,    [[-100,800+40],[800+40,800+40],[800+40,-100],[1500,-100],[1500,1540],[-150,1540],[-150,-100],[400,-100],[400,400],[-100,400]]);
        
    translate([-3677,-cat,stairH*13-45]) linear_extrude(5) polygon([[0,0],[0,cat],[cat,cat]]);
    
    translate([-3687,0,stairH*12-45]) linear_extrude(5) offset(5)offset(-5) polygon([[cat - 50*sqrt(2),0],[cat+100,0],[cat+100,-50],[cat-50,-50],[cat/2,-cat/2],[cat/2 - 50/sqrt(2),-cat/2 + 50/sqrt(2)]]);

    
    //hihger round 3 stepr
        if(1)translate([-norWallDist+970,0,-0.01])mirror([1,0,0])color( steel, stairAlpha ) translate([0,-1650,16*stairH-5]) rotate([0,0,0]) stair(3,stairD,stairH,440+offsetv_,stairD+offsetv_,5,offsetv,offsetv_);
        
        if(1)translate([-norWallDist+970,0,-0.01])mirror([1,0,0])color( steel, stairAlpha ) translate([0,-1650,16*stairH-5]) rotate([0,0,0]) stair(3,stairD,stairH,50,stairD+nosing,5,offsetv,0);
        if(1)translate([-norWallDist+40,0,-0.01])mirror([1,0,0])color( steel, stairAlpha ) translate([0,-1650,16*stairH-5]) rotate([0,0,0]) stair(3,stairD,stairH,50,stairD+nosing,5,offsetv,0);

//repair washes -2705, -963, 1922.8
translate([-2705, -963, 1925.4])linear_extrude(5)circle(25);
translate([-2705, -963, 1925.4+stairH])linear_extrude(5)circle(25);
        translate([ -3655, -980, 2253.2+stairH])linear_extrude(5)circle(25);
        translate([-3655, -590, 2089])linear_extrude(5)circle(25);
        
}


if( generateStepPlatesDFX) if(stepPlates)                                       difference(){stairsPlatets(7,10);handrailGrating(23,8);}
if(!generateStepPlatesDFX) if(stepPlates)   color( steel, stairAlpha ) render() difference(){stairsPlatets(7,10);handrailGrating(23,8);}

module triangle(){
    
}
*translate([-3787,-400,stairH*10]) cube(400);
//translate([-2980,-350,stairH*10]) linear_extrude(200) circle(350);
cat = 435;
*translate([-3687,-cat,stairH*13-45]) linear_extrude(5) polygon([[0,0],[0,cat],[cat,cat]]);



//ступени
if(strs){
    offsetv=5;
    x=1300;
    y=1390;
translate([-1260,-1260,6*stairH])  color( wood, stairAlpha )pivot5x5(40,stairH,nosing,1000,offsetv,0);
translate([-1000-stairD*2-3*sh,0,6*stairH]) rotate([0,0,270]) stair(4,stairD,stairH,1000,stairD+nosing,stairTHS,offsetv,0);//нижний пролет
translate([-norWallDist +1370,-1390,stairH*16]) rotate([0,0,90]) color( wood, stairAlpha )pivot6x6(40,stairH,nosing,1000,offsetv,0,[[y+0,x+0],[y+100,x+0],[y+100,x+100],[y+0,x+100]]);
translate([-norWallDist-20,-1650,16*stairH]) rotate([0,0,0]) stair(3,stairD,stairH,1000,stairD+nosing,stairTHS,offsetv,0);//верхний пролет
}
//Стена спальня
module bdrwall(){
    if(allco || (allca && 0)) %color(  alpha = alphaWalls ) translate([0,0,0]) rotate([90,0,180]) linear_extrude(height = 340, center = false,  twist = 0) difference(){
    square([corid_length,flourtoflour],center=false);    
    translate([wallNorth+arcDoorWay/2,arcDoorWayHeith-arcDoorWay/2,0])  circle(d=arcDoorWay);
    translate([wallNorth,0,0])  square([arcDoorWay,arcDoorWayHeith-arcDoorWay/2],center=false);
    if(meshCoef != 0.0)mesh(meshSize,meshCoef);
    
}
}
bdrwall();
//Стена ванна туалет
if(allco || (allca && 1)) color(  alpha = alphaWalls ) translate([0,-65-corid_width,0]) rotate([90,0,180]) linear_extrude(height = 65, center = false,  twist = 0) difference(){
    square([corid_length,ceilingtoflour-15],center=false);    
    translate([corid_length-eastOpening,0,0])  square([eastOpening,ceilingtoflour],center=false);
    translate([-eastMeas4 + corid_length,0,0])  square([eastDoorWayUnif,eastDoorWayHeith],center=false);
    translate([-eastMeas2 + corid_length,0,0])  square([eastDoorWayUnif,eastDoorWayHeith],center=false);
    
    if(meshCoef != 0.0)mesh(meshSize,meshCoef);
    
}

//Стена с окном
if(allco || (allca && 0)) color(  alpha = alphaWalls ) translate([0,5-corid_width,0]) rotate([90,0,90]) linear_extrude(height = 5, center = false,  twist = 0) difference(){
    square([corid_width,flourtoflour],center=false);    
    translate([norLeft,windowToFlour,0])  square([norWindowWdth,2500],center=false);
    if(meshCoef != 0.0)mesh(meshSize,meshCoef);
    
}

//Стена с дверью входной
if(allco || (allca && 0)) color(  alpha = alphaWalls ) translate([-corid_length,5-corid_width,0]) rotate([90,0,90]) linear_extrude(height = 5, center = false,  twist = 0) difference(){
    square([corid_width,flourtoflour],center=false);    
    translate([600,0,0])  square([900,2100],center=false);
    if(meshCoef != 0.0)mesh(meshSize,meshCoef);
    
}

//перекрытие малое
if(allco || (allca && 0)) color( ceiling, alpha = alphaWalls ) translate([-plateWidth,-60-corid_width,ceilingtoflour])  linear_extrude(height =  flourtoflour - ceilingtoflour, center = false,  twist = 0) difference(){
    square([plateWidth,corid_width+60],center=false);    
    
    if(meshCoef != 0.0)mesh(meshSize,meshCoef);
    
}

//Вспомогательная плоскость
if(0)if(allco || (allca && 0)) color( ceiling, alpha = alphaWalls ) translate([-norWallDist,5-corid_width,ceilingtoflour]) rotate([0,90,0]) linear_extrude(height = 5, center = false,  twist = 0) difference(){
    square([plateWidth,corid_width],center=false);    
    
    if(meshCoef != 0.0)mesh(meshSize,meshCoef);
    
}

//перекрытие большое
if(allco || (allca && 0)) color( ceiling, alpha = alphaWalls ) translate([-corid_length,-65-corid_width,ceilingtoflour])  linear_extrude(height = flourtoflour - ceilingtoflour, center = false,  twist = 0) difference(){
    square([corid_length-norWallDist,corid_width+65],center=false); 
 echo("per",corid_length-norWallDist,corid_length,norWallDist)   
    
    if(meshCoef != 0.0)mesh(meshSize,meshCoef);
    
}

//перекрытие приемное
if(allco || (allca && 0)) color( ceiling, alpha = alphaWalls ) translate([-corid_length+eastOpening,-65-corid_width-1000,ceilingtoflour])  
    linear_extrude(height = flourtoflour - ceilingtoflour, center = false,  twist = 0) 
        difference(){
            square([corid_length-eastOpening,1000],center=false);   
            if(meshCoef != 0.0)mesh(meshSize,meshCoef);   
        }
}//end super foo
    //super();
if(generateStepPlatesDFX)for (i =[0:1:4]){
    
    for (j =[0:1:4]){
        s = 42-(j+5*i)*stairH;
        translate([i*1900,j*1900,0]) projection(cut=true) translate([0, 0, s]) super(); //cube([500,600,6000]); 
        echo(s);
    }
   
    
}     
else if(generateLowStumpsMeas){//projection(cut=true) translate([0,0,-350])
    translate([3545,-48.5,0])rotate([90,00,90-123])super();
    alpha = 11.9;
     h = (117 - 14.5)/2;//halfThicknes
    mirror([0,1,0])translate([-30   ,-300,-755])color("black")text("st:102,5 alpa: 11,9",size = 40);
    //full thichness - 102.5
    
    
    
    if(1){
        b = 14.5;
        l = 100.5;
    translate([b,0,-755]) color("red") sphere(r = 0.5);
    translate([117,0,-755]) color("red") sphere(r = 0.5);
    color("red") translate([b+h,      0,-755])rotate([90,00,alpha])linear_extrude(l)circle(0.1); 
    mirror([0,1,0])translate([b-150   ,-200,-755])color("black")text(str("b:",b," l:",l),size = 40);
    }
    if(1){
        b = 318;
        l = 102;
    translate([b,0,-755]) color("red") sphere(r = 0.5);
    color("red") translate([b+h,      0,-755])rotate([90,00,alpha])linear_extrude(l)circle(0.1); 
    mirror([0,1,0])translate([b-100   ,+200,-755])color("black")text(str("b:",b," l:",l),size = 40);
    }
    if(1){
        b = 595.5;
        l = 84;
    translate([b,0,-755]) color("red") sphere(r = 0.5);
    color("red") translate([b+h,      0,-755])rotate([90,00,alpha])linear_extrude(l)circle(0.1); 
    mirror([0,1,0])translate([b-100   ,-200,-755])color("black")text(str("b:",b," l:",l),size = 40);
    }    
    if(1){
        b = 891;
        l = 78.5;
    translate([b,0,-755]) color("red") sphere(r = 0.5);
    color("red") translate([b+h,      0,-755])rotate([90,00,alpha])linear_extrude(l)circle(0.1); 
    mirror([0,1,0])translate([b-100   ,200,-755])color("black")text(str("b:",b," l:",l),size = 40);
    }      
    if(1){
        b = 1198;
        l = 83;
    translate([b,0,-755]) color("red") sphere(r = 0.5);
    color("red") translate([b+h,      0,-755])rotate([90,00,alpha])linear_extrude(l)circle(0.1); 
    mirror([0,1,0])translate([b-100   ,-200,-755])color("black")text(str("b:",b," l:",l),size = 40);
    }     
    if(1){
        b = 1504.5;
        l = 87;
    translate([b,0,-755]) color("red") sphere(r = 0.5);
    color("red") translate([b+h,      0,-755])rotate([90,00,alpha])linear_extrude(l)circle(0.1); 
    mirror([0,1,0])translate([b-100   ,200,-755])color("black")text(str("b:",b," l:",l),size = 40);
    }     
    if(1){
        b = 1811;
        l = 91;
    translate([b,0,-755]) color("red") sphere(r = 0.5);
    color("red") translate([b+h,      0,-755])rotate([90,00,alpha])linear_extrude(l)circle(0.1); 
    mirror([0,1,0])translate([b-100   ,-200,-755])color("black")text(str("b:",b," l:",l),size = 40);
    }     
    if(1){
        b = 2089;
        l = 73;
    translate([b,0,-755]) color("red") sphere(r = 0.5);
    color("red") translate([b+h,      0,-755])rotate([90,00,alpha])linear_extrude(l)circle(0.1); 
    mirror([0,1,0])translate([b-100   ,200,-755])color("black")text(str("b:",b," l:",l),size = 40);
    }     
    

    

    
    
    

}
else if(generateHighStumpsMeas){//projection(cut=true) translate([0,0,-350])
    translate([-1527.5,-1221.8,-3100])rotate([90-56.5,90,90])super();
    
     h = (352.5 - 250.5)/2;//halfThicknes
    //full thichness - 102
    translate([-10   ,100,255])color("black")text("full thichness - 102",size = 40);
    translate([250.5,0,10]) color("red") sphere(r = 0.5);
    translate([352.5,0,10]) color("red") sphere(r = 0.5);
    color("red") translate([250.5 +h,0,10])rotate([90,00,191.4])linear_extrude(86.5)circle(0.1);//122.28 
    translate([-30   ,-200,255])color("black")text("b:250.5 e:352.5 l:86.5 ",size = 40);
    
    translate([549.5,0,10]) color("red") sphere(r = 0.5);   
    color("red") translate([549.5 + h,0,10])rotate([90,00,191.4])linear_extrude(85.5)circle(0.1);//122.28 
    translate([400   ,200,255])color("black")text("b:549.5  l:86.5 ",size = 40);
    
    translate([834,0,10]) color("red") sphere(r = 0.5);    
    color("red") translate([834 + h,0,10])rotate([90,00,191.4])linear_extrude(95)circle(0.1);//122.28 
    translate([800   ,-200,255])color("black")text("b:834  l:95 ",size = 40);
    
    translate([1118.3,0,10]) color("red") sphere(r = 0.5);//307.5   
    color("red") translate([1118.3 + h,0,10])rotate([90,00,191.4])linear_extrude(105)circle(0.1);//122.28 
    translate([980   ,200,255])color("black")text("b:1118.3  l:105 ",size = 40);

    //l - 105
    translate([1424.5,0,10]) color("red") sphere(r = 0.5);
    translate([1324   ,-200,255])color("black")text("b:1424.5  l:105 ",size = 40);
    
    //l - 105
    translate([1730.5,0,10]) color("red") sphere(r = 0.5);
    translate([1630   ,200,255])color("black")text("b:1730.3  l:105 ",size = 40);


    //the summ for all stumps 1049 aleast 1300 of tube is enough.

    
    

}
else super();
    
    
    
